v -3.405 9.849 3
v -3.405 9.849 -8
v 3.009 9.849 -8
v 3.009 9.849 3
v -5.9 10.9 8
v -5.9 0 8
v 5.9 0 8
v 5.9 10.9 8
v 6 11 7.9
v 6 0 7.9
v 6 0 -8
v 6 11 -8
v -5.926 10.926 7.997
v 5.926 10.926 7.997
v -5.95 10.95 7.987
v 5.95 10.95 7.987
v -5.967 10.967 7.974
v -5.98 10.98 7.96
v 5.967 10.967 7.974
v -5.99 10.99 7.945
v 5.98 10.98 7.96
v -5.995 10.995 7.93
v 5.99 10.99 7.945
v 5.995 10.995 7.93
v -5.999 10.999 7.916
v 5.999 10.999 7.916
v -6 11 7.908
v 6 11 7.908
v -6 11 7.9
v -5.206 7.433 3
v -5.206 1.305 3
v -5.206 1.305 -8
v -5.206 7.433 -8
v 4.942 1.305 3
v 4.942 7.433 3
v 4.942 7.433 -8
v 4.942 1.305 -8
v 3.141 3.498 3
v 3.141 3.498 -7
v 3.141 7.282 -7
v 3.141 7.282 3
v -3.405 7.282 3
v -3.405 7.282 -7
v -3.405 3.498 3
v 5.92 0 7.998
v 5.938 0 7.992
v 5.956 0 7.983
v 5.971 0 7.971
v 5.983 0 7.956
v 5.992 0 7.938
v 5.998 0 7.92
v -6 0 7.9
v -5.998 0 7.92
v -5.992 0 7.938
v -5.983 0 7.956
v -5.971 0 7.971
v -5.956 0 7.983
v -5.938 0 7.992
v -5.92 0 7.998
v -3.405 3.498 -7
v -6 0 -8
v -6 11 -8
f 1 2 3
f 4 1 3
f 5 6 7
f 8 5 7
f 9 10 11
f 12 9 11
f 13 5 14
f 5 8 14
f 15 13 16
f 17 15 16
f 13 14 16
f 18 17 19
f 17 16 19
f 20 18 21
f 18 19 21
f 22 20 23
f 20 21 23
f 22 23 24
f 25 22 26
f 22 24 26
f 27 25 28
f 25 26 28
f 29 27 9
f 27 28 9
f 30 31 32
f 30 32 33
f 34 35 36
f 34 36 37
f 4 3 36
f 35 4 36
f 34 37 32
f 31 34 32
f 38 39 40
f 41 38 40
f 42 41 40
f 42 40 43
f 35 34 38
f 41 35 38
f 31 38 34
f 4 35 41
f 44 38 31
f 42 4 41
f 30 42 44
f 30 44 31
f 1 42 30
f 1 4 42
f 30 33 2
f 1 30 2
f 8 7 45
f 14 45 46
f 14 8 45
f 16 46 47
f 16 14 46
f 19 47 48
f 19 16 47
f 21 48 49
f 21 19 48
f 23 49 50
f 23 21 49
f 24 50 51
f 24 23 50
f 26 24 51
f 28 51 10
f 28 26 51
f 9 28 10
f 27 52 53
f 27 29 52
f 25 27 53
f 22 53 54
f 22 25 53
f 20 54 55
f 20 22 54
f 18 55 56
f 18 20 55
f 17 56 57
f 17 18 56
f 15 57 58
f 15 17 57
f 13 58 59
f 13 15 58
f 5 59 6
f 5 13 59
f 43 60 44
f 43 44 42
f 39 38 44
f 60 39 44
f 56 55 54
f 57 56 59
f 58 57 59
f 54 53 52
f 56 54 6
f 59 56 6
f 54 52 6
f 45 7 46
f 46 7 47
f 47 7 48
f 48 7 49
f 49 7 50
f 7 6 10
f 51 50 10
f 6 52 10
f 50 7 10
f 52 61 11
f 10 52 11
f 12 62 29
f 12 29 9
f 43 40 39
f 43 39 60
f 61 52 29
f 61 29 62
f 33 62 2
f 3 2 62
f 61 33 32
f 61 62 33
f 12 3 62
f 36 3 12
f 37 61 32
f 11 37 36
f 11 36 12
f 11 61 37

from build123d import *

# Parameters (mm, degrees)
SKETCH1_W           = 12
SKETCH1_H           = 16
BOSS_EXTRUDE1_DEPTH = 11
CUT_EXTRUDE1_DEPTH  = 11
FILLET1_R           = 0.1
SKETCH5_W           = 6.545638519
SKETCH5_H           = 3.78409842
BOSS_EXTRUDE2_DEPTH = 10


with BuildPart() as part:
    # Sketch1 → Boss-Extrude1 (new body)
    with BuildSketch(Plane(origin=(0, 0, 0), x_dir=(1, 0, 0), z_dir=(0, 1, 0))):
        Rectangle(SKETCH1_W, SKETCH1_H)
    extrude(amount=BOSS_EXTRUDE1_DEPTH)

    # Sketch4 → Cut-Extrude1 (cut)
    with BuildSketch(Plane(origin=(0, 0, -8), x_dir=(-1, 0, 0), z_dir=(0, 0, -1))):
        Polygon((-4.942176734, 1.304641084), (5.205759493, 1.304641084), (5.205759493, 7.432940234), (3.404610639, 9.849115526), (-3.0092365, 9.849115526), (-4.942176734, 7.432940234), align=None)
    extrude(amount=-CUT_EXTRUDE1_DEPTH, mode=Mode.SUBTRACT)

    # Fillet1
    fillet1_edges = [part.edges().sort_by_distance(p)[0] for p in [
        (0, 11, 8),
        (6, 5.5, 8),
        (-6, 5.5, 8),
    ]]
    fillet(fillet1_edges, radius=FILLET1_R)

    # Sketch5 → Boss-Extrude2 (add)
    with BuildSketch(Plane(origin=(0, 0, 3), x_dir=(-1, 0, 0), z_dir=(0, 0, -1))):
        with Locations((0.13179138, 5.389997139)):
            Rectangle(SKETCH5_W, SKETCH5_H)
    extrude(amount=BOSS_EXTRUDE2_DEPTH)


solid = part.part
